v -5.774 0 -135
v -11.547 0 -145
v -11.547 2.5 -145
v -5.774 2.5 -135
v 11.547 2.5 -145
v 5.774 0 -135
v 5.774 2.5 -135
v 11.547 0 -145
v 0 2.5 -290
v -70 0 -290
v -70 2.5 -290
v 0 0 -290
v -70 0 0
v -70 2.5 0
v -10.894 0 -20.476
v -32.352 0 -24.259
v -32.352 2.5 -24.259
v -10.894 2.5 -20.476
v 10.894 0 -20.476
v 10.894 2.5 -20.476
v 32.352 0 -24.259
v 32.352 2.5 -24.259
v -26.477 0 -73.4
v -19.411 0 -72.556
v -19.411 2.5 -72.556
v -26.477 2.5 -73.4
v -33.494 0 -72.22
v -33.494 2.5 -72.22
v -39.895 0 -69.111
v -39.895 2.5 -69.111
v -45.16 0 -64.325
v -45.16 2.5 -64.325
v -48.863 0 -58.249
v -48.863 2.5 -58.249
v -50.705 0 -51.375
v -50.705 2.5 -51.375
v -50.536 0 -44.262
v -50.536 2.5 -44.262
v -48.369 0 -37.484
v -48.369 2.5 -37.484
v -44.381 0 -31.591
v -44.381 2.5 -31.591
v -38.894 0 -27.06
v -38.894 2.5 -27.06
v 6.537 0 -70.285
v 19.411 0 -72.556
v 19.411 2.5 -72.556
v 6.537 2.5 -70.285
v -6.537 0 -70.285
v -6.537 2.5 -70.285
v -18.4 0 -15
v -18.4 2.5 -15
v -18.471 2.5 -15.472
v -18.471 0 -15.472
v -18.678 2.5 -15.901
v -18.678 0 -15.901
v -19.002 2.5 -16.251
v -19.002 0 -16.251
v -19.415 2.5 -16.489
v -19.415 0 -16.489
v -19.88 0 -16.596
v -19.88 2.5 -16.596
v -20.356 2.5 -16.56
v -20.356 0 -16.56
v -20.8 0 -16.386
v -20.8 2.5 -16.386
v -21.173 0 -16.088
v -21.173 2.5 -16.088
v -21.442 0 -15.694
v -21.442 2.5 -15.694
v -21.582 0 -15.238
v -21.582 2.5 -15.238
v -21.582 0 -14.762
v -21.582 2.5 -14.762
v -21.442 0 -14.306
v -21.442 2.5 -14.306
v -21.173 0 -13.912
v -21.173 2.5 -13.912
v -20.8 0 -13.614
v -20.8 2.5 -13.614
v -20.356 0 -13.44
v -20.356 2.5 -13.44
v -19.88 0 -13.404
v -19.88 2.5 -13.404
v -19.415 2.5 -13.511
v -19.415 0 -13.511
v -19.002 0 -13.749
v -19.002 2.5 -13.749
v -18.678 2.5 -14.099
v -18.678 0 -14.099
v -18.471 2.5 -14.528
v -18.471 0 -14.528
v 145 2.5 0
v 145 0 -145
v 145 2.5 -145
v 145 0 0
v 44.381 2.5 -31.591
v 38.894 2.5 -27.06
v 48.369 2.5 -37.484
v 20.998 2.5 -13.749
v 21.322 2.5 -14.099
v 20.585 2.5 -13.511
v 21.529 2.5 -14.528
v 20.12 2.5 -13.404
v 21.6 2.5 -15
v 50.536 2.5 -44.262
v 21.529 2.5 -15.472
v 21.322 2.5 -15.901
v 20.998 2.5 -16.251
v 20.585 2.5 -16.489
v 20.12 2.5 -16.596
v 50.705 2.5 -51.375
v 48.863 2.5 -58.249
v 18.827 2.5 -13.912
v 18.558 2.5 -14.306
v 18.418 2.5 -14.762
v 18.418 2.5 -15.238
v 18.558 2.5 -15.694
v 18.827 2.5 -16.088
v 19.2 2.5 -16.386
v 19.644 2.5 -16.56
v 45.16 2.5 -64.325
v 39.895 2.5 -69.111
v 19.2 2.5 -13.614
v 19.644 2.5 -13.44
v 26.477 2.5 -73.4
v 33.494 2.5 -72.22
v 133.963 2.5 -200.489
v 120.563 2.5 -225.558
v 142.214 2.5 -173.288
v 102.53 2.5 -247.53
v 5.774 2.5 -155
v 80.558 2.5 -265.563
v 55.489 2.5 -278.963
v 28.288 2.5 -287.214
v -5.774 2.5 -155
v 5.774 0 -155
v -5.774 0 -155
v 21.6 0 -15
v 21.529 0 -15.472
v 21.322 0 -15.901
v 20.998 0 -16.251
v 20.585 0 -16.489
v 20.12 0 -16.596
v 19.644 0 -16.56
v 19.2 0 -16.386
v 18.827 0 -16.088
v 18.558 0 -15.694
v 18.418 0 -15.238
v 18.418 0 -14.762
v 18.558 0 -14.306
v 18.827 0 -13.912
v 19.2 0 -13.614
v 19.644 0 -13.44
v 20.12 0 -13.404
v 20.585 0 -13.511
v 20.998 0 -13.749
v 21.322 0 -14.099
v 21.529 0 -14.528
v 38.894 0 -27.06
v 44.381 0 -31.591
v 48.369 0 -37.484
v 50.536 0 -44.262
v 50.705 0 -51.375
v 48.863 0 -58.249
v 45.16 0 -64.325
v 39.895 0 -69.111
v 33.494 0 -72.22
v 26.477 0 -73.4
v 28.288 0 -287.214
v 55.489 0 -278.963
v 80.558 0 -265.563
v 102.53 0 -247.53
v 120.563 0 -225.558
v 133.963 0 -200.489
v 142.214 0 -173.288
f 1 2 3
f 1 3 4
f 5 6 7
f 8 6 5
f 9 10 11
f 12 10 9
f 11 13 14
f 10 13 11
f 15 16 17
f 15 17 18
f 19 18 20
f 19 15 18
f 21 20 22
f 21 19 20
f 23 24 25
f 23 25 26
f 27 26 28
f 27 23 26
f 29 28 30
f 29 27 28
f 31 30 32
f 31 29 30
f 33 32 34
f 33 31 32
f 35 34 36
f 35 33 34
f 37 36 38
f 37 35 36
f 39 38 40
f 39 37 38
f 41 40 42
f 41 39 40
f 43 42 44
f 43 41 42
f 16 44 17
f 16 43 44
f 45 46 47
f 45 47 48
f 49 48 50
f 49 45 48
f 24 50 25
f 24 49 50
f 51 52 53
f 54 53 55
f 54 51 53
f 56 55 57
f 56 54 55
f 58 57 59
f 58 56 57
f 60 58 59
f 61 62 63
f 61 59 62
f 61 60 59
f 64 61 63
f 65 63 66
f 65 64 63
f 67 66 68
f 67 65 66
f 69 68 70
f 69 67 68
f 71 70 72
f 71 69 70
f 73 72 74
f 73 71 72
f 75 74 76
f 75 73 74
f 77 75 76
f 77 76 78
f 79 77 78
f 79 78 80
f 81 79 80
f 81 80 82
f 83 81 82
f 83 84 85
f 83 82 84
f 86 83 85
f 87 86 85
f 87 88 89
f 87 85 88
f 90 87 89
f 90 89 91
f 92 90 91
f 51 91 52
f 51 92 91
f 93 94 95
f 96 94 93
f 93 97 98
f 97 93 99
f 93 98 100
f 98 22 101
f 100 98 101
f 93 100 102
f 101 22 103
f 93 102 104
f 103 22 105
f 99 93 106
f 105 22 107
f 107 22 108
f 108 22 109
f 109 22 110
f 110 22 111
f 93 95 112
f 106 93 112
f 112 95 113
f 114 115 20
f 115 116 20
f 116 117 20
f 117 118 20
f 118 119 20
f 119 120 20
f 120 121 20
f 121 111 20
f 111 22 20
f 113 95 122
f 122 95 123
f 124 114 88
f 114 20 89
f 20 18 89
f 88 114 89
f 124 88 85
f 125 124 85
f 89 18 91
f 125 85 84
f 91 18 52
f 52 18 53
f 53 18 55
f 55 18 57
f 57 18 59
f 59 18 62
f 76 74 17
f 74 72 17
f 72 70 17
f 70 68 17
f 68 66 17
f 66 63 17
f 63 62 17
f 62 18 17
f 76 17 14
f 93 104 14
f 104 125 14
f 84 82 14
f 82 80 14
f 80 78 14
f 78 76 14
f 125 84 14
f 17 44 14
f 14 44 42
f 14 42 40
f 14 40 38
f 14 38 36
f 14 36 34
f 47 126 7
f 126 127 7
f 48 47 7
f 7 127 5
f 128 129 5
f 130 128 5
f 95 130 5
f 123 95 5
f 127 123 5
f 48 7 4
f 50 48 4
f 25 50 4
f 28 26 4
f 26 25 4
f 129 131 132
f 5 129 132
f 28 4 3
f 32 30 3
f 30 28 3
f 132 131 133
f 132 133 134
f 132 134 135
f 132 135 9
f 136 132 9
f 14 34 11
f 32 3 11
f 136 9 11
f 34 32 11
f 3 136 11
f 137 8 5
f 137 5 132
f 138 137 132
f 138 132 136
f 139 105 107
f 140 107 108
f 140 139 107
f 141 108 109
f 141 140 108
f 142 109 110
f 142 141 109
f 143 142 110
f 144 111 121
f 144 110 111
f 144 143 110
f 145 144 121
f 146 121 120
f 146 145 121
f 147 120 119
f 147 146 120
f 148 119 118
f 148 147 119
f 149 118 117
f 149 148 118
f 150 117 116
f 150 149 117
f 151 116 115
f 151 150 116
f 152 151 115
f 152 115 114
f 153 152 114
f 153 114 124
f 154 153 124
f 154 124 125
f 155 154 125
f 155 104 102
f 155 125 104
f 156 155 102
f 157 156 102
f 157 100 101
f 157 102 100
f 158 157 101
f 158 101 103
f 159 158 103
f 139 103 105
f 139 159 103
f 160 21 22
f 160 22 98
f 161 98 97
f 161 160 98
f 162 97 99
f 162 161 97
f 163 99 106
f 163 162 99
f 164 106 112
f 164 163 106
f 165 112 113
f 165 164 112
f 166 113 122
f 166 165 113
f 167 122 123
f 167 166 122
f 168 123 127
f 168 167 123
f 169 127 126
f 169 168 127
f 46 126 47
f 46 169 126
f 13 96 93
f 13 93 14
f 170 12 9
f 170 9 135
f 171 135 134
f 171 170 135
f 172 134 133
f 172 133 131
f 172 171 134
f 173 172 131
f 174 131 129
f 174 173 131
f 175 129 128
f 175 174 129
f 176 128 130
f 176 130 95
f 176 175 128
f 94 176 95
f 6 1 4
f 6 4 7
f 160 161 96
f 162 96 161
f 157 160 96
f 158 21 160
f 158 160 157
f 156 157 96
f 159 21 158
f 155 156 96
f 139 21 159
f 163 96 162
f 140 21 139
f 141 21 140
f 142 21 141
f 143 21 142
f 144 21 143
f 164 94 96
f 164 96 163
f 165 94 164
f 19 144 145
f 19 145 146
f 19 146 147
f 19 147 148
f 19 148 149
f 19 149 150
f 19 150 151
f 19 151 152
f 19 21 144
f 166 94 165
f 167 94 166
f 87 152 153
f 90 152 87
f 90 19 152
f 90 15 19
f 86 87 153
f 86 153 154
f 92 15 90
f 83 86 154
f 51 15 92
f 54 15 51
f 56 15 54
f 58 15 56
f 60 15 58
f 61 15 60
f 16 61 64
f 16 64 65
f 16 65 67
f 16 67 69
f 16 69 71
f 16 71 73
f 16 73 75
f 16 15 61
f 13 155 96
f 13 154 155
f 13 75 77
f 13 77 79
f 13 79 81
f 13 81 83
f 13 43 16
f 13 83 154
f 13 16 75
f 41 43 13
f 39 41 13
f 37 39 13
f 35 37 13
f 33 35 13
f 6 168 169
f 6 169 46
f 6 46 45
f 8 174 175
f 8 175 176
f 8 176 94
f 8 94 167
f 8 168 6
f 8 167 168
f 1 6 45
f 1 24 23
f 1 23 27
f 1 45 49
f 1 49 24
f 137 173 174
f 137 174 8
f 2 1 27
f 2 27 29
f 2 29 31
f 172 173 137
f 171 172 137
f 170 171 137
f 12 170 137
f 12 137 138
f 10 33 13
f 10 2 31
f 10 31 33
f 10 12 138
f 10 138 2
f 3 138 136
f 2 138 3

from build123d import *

# Parameters (mm, degrees)
BOSS_EXTRUDE2_DEPTH = 2.5
CUT_EXTRUDE5_DEPTH  = 3.5
CUT_EXTRUDE7_DEPTH  = 3.5
SKETCH8_R           = 1.6
CUT_EXTRUDE8_DEPTH  = 3.5


with BuildPart() as part:
    # Sketch1 → Boss-Extrude2 (new body)
    with BuildSketch(Plane(origin=(0, 0, 0), x_dir=(1, 0, 0), z_dir=(0, 1, 0))):
        with BuildLine():
            Line((0, 0), (-70, 0))
            Line((-70, 0), (-70, 290))
            Line((-70, 290), (0, 290))
            ThreePointArc((0, 290), (102.530483272, 247.530483272), (145, 145))
            Line((145, 145), (145, 0))
            Line((145, 0), (0, 0))
        make_face()
    extrude(amount=BOSS_EXTRUDE2_DEPTH)

    # Sketch6 → Cut-Extrude5 (cut, through all)
    with BuildSketch(Plane(origin=(0, 0, 0), x_dir=(1, 0, 0), z_dir=(0, 1, 0))):
        Polygon((5.773502692, 135), (11.547005384, 145), (5.773502692, 155), (-5.773502692, 155), (-11.547005384, 145), (-5.773502692, 135), align=None)
    extrude(amount=CUT_EXTRUDE5_DEPTH, mode=Mode.SUBTRACT)

    # Sketch7 → Cut-Extrude7 (cut, through all)
    with BuildSketch(Plane(origin=(0, 0, 0), x_dir=(1, 0, 0), z_dir=(0, 1, 0))):
        with BuildLine():
            ThreePointArc((-32.352380638, 24.259271714), (0, 20), (32.352380638, 24.259271714))
            ThreePointArc((32.352380638, 24.259271714), (50.030050167, 54.877893499), (19.411428383, 72.555563028))
            ThreePointArc((19.411428383, 72.555563028), (0, 70), (-19.411428383, 72.555563028))
            ThreePointArc((-19.411428383, 72.555563028), (-50.030050167, 54.877893499), (-32.352380638, 24.259271714))
        make_face()
    extrude(amount=CUT_EXTRUDE7_DEPTH, mode=Mode.SUBTRACT)

    # Sketch8 → Cut-Extrude8 (cut, through all)
    with BuildSketch(Plane(origin=(0, 0, 0), x_dir=(1, 0, 0), z_dir=(0, 1, 0))):
        with Locations((-20, 15)):
            Circle(SKETCH8_R)
        with Locations((20, 15)):
            Circle(SKETCH8_R)
    extrude(amount=CUT_EXTRUDE8_DEPTH, mode=Mode.SUBTRACT)


solid = part.part
